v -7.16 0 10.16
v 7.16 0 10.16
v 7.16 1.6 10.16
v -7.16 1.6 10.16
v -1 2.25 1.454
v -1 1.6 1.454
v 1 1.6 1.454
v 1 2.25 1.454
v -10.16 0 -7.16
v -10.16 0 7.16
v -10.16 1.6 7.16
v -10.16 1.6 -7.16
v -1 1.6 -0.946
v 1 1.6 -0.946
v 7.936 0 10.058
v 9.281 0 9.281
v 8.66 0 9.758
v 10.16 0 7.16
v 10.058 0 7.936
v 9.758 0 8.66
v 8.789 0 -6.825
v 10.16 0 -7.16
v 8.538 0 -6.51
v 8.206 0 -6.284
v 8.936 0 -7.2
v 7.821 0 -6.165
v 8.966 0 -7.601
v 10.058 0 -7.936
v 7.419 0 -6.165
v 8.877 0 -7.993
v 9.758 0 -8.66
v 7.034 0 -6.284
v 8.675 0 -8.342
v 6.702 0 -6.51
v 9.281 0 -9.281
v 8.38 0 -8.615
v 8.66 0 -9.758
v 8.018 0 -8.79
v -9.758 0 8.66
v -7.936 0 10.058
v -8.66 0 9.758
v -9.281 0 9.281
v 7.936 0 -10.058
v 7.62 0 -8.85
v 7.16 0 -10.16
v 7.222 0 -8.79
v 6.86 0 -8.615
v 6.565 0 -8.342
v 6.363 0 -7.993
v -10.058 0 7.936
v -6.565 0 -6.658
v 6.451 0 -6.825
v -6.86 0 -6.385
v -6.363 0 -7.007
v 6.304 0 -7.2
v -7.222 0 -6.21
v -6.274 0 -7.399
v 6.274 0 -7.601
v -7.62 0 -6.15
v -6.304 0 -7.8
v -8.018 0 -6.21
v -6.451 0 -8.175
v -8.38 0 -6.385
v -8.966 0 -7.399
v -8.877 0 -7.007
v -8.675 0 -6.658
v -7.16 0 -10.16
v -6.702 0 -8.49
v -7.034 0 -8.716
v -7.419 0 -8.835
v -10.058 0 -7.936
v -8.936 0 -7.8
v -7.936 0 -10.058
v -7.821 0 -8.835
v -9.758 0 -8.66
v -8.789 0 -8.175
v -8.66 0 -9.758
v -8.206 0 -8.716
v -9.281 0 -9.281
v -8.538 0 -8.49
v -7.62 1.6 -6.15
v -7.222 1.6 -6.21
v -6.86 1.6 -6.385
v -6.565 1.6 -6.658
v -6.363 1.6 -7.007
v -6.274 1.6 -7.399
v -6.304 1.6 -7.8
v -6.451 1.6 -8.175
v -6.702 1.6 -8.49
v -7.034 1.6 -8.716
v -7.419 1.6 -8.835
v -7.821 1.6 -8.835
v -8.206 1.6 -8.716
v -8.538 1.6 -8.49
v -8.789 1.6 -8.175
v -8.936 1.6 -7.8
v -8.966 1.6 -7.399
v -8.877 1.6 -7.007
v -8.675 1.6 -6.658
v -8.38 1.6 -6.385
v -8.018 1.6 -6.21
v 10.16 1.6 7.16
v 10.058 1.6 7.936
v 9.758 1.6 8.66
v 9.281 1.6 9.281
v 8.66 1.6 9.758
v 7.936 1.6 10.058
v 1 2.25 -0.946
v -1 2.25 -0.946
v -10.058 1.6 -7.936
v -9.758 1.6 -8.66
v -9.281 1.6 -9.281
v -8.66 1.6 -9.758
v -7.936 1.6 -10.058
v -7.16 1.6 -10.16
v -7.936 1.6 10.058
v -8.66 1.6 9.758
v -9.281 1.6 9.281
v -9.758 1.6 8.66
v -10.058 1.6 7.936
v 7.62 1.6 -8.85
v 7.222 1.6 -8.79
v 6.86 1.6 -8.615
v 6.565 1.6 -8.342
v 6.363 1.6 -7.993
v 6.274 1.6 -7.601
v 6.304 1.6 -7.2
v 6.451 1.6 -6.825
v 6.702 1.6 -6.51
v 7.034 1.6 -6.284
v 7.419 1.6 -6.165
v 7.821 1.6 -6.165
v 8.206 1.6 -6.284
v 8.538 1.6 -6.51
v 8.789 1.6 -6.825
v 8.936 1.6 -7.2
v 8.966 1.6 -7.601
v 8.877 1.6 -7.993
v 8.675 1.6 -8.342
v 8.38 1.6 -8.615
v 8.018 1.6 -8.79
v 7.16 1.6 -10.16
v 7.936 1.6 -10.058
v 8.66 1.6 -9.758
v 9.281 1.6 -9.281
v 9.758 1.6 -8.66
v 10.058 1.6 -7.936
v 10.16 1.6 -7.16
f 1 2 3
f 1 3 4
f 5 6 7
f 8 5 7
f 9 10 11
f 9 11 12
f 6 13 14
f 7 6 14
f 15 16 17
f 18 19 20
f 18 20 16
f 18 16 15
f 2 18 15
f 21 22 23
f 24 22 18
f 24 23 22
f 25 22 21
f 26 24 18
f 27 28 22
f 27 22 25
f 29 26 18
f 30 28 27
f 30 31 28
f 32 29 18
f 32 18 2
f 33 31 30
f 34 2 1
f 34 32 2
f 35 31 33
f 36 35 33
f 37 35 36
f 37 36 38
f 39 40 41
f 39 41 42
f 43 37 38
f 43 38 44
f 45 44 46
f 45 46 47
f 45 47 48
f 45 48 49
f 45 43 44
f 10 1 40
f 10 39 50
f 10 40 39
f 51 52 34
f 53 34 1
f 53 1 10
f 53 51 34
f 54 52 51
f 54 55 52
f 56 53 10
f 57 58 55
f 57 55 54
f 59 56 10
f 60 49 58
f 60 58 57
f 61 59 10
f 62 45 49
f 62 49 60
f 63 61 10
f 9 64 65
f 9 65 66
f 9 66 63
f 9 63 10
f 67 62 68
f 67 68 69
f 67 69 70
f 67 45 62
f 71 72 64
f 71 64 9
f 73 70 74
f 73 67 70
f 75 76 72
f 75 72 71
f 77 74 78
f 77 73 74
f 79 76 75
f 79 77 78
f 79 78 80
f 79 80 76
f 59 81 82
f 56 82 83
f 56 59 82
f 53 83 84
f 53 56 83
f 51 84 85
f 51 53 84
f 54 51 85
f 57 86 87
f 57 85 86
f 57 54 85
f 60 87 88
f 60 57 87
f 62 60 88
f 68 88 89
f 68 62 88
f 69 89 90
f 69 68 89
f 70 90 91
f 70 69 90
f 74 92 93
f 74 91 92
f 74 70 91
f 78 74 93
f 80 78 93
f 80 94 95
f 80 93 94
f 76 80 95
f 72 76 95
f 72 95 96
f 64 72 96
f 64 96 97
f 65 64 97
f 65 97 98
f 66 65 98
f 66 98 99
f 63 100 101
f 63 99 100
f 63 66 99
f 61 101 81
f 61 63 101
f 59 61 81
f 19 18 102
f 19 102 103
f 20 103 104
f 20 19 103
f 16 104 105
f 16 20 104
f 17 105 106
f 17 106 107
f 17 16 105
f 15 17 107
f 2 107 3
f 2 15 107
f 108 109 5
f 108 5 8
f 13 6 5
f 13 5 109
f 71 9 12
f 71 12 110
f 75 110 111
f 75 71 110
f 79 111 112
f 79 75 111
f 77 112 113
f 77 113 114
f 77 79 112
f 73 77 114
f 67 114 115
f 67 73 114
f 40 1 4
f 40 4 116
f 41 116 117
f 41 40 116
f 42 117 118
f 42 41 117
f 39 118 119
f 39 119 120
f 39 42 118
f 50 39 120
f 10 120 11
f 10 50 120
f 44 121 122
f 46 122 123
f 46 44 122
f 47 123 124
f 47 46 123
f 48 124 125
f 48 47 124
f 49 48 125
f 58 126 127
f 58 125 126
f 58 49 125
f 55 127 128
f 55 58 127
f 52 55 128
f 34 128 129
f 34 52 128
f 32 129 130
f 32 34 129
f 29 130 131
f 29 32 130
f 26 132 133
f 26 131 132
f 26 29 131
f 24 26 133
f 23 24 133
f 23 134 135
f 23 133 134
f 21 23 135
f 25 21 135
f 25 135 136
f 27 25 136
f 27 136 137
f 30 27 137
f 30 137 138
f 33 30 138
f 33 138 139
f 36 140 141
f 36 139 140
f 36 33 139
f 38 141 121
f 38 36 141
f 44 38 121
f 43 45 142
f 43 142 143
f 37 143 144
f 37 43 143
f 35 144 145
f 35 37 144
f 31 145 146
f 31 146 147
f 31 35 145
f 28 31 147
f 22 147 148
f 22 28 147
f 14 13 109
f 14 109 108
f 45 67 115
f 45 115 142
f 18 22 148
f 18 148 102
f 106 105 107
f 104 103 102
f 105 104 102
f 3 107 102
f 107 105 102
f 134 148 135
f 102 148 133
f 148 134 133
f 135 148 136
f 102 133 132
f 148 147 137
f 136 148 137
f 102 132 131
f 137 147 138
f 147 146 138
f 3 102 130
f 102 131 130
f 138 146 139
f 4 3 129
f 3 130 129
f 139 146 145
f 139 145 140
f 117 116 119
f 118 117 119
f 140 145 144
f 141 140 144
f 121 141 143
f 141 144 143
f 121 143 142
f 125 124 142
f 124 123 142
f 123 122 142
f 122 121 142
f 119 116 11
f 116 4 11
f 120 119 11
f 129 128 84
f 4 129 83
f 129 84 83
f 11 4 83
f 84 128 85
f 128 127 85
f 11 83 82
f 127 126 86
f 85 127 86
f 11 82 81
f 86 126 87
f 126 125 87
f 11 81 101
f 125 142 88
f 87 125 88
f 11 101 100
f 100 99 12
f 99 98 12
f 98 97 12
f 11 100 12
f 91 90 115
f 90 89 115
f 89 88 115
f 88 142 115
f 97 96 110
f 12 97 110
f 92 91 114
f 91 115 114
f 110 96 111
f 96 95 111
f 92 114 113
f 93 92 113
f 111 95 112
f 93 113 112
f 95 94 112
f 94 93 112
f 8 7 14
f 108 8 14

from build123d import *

# Parameters (mm, degrees)
FR4_DEPTH            = 1.6
SKETCH4_R            = 1.35
HOLES_MOUNTING_DEPTH = 15.45721965
SKETCH5_W            = 2
SKETCH5_H            = 2.4
TCS34725_DEPTH       = 0.65


with BuildPart() as part:
    # Sketch2 → FR4 (new body)
    with BuildSketch(Plane(origin=(0, 0, 0), x_dir=(1, 0, 0), z_dir=(0, 1, 0))):
        with BuildLine():
            Line((-7.16, 10.16), (7.16, 10.16))
            ThreePointArc((7.16, 10.16), (9.281320344, 9.281320344), (10.16, 7.16))
            Line((10.16, 7.16), (10.16, -7.16))
            ThreePointArc((10.16, -7.16), (9.281320344, -9.281320344), (7.16, -10.16))
            Line((7.16, -10.16), (-7.16, -10.16))
            ThreePointArc((-7.16, -10.16), (-9.281320344, -9.281320344), (-10.16, -7.16))
            Line((-10.16, -7.16), (-10.16, 7.16))
            ThreePointArc((-10.16, 7.16), (-9.281320344, 9.281320344), (-7.16, 10.16))
        make_face()
    extrude(amount=FR4_DEPTH)

    # Sketch4 → holes-mounting (cut, through all)
    with BuildSketch(Plane(origin=(0, 0, 0), x_dir=(1, 0, 0), z_dir=(0, 1, 0))):
        with Locations(Location((-7.62, 7.5, 0), (0, 0, 270))):
            Circle(SKETCH4_R)
        with Locations(Location((7.62, 7.5, 0), (0, 0, 90))):
            Circle(SKETCH4_R)
    extrude(amount=HOLES_MOUNTING_DEPTH, mode=Mode.SUBTRACT)


with BuildPart() as body_2:
    # Sketch5 → TCS34725 (new body)
    with BuildSketch(Plane(origin=(0, 1.6, 0), x_dir=(1, 0, 0), z_dir=(0, 1, 0))):
        with Locations((0, -0.254)):
            Rectangle(SKETCH5_W, SKETCH5_H)
    extrude(amount=TCS34725_DEPTH)


solid = Compound([part.part, body_2.part])
